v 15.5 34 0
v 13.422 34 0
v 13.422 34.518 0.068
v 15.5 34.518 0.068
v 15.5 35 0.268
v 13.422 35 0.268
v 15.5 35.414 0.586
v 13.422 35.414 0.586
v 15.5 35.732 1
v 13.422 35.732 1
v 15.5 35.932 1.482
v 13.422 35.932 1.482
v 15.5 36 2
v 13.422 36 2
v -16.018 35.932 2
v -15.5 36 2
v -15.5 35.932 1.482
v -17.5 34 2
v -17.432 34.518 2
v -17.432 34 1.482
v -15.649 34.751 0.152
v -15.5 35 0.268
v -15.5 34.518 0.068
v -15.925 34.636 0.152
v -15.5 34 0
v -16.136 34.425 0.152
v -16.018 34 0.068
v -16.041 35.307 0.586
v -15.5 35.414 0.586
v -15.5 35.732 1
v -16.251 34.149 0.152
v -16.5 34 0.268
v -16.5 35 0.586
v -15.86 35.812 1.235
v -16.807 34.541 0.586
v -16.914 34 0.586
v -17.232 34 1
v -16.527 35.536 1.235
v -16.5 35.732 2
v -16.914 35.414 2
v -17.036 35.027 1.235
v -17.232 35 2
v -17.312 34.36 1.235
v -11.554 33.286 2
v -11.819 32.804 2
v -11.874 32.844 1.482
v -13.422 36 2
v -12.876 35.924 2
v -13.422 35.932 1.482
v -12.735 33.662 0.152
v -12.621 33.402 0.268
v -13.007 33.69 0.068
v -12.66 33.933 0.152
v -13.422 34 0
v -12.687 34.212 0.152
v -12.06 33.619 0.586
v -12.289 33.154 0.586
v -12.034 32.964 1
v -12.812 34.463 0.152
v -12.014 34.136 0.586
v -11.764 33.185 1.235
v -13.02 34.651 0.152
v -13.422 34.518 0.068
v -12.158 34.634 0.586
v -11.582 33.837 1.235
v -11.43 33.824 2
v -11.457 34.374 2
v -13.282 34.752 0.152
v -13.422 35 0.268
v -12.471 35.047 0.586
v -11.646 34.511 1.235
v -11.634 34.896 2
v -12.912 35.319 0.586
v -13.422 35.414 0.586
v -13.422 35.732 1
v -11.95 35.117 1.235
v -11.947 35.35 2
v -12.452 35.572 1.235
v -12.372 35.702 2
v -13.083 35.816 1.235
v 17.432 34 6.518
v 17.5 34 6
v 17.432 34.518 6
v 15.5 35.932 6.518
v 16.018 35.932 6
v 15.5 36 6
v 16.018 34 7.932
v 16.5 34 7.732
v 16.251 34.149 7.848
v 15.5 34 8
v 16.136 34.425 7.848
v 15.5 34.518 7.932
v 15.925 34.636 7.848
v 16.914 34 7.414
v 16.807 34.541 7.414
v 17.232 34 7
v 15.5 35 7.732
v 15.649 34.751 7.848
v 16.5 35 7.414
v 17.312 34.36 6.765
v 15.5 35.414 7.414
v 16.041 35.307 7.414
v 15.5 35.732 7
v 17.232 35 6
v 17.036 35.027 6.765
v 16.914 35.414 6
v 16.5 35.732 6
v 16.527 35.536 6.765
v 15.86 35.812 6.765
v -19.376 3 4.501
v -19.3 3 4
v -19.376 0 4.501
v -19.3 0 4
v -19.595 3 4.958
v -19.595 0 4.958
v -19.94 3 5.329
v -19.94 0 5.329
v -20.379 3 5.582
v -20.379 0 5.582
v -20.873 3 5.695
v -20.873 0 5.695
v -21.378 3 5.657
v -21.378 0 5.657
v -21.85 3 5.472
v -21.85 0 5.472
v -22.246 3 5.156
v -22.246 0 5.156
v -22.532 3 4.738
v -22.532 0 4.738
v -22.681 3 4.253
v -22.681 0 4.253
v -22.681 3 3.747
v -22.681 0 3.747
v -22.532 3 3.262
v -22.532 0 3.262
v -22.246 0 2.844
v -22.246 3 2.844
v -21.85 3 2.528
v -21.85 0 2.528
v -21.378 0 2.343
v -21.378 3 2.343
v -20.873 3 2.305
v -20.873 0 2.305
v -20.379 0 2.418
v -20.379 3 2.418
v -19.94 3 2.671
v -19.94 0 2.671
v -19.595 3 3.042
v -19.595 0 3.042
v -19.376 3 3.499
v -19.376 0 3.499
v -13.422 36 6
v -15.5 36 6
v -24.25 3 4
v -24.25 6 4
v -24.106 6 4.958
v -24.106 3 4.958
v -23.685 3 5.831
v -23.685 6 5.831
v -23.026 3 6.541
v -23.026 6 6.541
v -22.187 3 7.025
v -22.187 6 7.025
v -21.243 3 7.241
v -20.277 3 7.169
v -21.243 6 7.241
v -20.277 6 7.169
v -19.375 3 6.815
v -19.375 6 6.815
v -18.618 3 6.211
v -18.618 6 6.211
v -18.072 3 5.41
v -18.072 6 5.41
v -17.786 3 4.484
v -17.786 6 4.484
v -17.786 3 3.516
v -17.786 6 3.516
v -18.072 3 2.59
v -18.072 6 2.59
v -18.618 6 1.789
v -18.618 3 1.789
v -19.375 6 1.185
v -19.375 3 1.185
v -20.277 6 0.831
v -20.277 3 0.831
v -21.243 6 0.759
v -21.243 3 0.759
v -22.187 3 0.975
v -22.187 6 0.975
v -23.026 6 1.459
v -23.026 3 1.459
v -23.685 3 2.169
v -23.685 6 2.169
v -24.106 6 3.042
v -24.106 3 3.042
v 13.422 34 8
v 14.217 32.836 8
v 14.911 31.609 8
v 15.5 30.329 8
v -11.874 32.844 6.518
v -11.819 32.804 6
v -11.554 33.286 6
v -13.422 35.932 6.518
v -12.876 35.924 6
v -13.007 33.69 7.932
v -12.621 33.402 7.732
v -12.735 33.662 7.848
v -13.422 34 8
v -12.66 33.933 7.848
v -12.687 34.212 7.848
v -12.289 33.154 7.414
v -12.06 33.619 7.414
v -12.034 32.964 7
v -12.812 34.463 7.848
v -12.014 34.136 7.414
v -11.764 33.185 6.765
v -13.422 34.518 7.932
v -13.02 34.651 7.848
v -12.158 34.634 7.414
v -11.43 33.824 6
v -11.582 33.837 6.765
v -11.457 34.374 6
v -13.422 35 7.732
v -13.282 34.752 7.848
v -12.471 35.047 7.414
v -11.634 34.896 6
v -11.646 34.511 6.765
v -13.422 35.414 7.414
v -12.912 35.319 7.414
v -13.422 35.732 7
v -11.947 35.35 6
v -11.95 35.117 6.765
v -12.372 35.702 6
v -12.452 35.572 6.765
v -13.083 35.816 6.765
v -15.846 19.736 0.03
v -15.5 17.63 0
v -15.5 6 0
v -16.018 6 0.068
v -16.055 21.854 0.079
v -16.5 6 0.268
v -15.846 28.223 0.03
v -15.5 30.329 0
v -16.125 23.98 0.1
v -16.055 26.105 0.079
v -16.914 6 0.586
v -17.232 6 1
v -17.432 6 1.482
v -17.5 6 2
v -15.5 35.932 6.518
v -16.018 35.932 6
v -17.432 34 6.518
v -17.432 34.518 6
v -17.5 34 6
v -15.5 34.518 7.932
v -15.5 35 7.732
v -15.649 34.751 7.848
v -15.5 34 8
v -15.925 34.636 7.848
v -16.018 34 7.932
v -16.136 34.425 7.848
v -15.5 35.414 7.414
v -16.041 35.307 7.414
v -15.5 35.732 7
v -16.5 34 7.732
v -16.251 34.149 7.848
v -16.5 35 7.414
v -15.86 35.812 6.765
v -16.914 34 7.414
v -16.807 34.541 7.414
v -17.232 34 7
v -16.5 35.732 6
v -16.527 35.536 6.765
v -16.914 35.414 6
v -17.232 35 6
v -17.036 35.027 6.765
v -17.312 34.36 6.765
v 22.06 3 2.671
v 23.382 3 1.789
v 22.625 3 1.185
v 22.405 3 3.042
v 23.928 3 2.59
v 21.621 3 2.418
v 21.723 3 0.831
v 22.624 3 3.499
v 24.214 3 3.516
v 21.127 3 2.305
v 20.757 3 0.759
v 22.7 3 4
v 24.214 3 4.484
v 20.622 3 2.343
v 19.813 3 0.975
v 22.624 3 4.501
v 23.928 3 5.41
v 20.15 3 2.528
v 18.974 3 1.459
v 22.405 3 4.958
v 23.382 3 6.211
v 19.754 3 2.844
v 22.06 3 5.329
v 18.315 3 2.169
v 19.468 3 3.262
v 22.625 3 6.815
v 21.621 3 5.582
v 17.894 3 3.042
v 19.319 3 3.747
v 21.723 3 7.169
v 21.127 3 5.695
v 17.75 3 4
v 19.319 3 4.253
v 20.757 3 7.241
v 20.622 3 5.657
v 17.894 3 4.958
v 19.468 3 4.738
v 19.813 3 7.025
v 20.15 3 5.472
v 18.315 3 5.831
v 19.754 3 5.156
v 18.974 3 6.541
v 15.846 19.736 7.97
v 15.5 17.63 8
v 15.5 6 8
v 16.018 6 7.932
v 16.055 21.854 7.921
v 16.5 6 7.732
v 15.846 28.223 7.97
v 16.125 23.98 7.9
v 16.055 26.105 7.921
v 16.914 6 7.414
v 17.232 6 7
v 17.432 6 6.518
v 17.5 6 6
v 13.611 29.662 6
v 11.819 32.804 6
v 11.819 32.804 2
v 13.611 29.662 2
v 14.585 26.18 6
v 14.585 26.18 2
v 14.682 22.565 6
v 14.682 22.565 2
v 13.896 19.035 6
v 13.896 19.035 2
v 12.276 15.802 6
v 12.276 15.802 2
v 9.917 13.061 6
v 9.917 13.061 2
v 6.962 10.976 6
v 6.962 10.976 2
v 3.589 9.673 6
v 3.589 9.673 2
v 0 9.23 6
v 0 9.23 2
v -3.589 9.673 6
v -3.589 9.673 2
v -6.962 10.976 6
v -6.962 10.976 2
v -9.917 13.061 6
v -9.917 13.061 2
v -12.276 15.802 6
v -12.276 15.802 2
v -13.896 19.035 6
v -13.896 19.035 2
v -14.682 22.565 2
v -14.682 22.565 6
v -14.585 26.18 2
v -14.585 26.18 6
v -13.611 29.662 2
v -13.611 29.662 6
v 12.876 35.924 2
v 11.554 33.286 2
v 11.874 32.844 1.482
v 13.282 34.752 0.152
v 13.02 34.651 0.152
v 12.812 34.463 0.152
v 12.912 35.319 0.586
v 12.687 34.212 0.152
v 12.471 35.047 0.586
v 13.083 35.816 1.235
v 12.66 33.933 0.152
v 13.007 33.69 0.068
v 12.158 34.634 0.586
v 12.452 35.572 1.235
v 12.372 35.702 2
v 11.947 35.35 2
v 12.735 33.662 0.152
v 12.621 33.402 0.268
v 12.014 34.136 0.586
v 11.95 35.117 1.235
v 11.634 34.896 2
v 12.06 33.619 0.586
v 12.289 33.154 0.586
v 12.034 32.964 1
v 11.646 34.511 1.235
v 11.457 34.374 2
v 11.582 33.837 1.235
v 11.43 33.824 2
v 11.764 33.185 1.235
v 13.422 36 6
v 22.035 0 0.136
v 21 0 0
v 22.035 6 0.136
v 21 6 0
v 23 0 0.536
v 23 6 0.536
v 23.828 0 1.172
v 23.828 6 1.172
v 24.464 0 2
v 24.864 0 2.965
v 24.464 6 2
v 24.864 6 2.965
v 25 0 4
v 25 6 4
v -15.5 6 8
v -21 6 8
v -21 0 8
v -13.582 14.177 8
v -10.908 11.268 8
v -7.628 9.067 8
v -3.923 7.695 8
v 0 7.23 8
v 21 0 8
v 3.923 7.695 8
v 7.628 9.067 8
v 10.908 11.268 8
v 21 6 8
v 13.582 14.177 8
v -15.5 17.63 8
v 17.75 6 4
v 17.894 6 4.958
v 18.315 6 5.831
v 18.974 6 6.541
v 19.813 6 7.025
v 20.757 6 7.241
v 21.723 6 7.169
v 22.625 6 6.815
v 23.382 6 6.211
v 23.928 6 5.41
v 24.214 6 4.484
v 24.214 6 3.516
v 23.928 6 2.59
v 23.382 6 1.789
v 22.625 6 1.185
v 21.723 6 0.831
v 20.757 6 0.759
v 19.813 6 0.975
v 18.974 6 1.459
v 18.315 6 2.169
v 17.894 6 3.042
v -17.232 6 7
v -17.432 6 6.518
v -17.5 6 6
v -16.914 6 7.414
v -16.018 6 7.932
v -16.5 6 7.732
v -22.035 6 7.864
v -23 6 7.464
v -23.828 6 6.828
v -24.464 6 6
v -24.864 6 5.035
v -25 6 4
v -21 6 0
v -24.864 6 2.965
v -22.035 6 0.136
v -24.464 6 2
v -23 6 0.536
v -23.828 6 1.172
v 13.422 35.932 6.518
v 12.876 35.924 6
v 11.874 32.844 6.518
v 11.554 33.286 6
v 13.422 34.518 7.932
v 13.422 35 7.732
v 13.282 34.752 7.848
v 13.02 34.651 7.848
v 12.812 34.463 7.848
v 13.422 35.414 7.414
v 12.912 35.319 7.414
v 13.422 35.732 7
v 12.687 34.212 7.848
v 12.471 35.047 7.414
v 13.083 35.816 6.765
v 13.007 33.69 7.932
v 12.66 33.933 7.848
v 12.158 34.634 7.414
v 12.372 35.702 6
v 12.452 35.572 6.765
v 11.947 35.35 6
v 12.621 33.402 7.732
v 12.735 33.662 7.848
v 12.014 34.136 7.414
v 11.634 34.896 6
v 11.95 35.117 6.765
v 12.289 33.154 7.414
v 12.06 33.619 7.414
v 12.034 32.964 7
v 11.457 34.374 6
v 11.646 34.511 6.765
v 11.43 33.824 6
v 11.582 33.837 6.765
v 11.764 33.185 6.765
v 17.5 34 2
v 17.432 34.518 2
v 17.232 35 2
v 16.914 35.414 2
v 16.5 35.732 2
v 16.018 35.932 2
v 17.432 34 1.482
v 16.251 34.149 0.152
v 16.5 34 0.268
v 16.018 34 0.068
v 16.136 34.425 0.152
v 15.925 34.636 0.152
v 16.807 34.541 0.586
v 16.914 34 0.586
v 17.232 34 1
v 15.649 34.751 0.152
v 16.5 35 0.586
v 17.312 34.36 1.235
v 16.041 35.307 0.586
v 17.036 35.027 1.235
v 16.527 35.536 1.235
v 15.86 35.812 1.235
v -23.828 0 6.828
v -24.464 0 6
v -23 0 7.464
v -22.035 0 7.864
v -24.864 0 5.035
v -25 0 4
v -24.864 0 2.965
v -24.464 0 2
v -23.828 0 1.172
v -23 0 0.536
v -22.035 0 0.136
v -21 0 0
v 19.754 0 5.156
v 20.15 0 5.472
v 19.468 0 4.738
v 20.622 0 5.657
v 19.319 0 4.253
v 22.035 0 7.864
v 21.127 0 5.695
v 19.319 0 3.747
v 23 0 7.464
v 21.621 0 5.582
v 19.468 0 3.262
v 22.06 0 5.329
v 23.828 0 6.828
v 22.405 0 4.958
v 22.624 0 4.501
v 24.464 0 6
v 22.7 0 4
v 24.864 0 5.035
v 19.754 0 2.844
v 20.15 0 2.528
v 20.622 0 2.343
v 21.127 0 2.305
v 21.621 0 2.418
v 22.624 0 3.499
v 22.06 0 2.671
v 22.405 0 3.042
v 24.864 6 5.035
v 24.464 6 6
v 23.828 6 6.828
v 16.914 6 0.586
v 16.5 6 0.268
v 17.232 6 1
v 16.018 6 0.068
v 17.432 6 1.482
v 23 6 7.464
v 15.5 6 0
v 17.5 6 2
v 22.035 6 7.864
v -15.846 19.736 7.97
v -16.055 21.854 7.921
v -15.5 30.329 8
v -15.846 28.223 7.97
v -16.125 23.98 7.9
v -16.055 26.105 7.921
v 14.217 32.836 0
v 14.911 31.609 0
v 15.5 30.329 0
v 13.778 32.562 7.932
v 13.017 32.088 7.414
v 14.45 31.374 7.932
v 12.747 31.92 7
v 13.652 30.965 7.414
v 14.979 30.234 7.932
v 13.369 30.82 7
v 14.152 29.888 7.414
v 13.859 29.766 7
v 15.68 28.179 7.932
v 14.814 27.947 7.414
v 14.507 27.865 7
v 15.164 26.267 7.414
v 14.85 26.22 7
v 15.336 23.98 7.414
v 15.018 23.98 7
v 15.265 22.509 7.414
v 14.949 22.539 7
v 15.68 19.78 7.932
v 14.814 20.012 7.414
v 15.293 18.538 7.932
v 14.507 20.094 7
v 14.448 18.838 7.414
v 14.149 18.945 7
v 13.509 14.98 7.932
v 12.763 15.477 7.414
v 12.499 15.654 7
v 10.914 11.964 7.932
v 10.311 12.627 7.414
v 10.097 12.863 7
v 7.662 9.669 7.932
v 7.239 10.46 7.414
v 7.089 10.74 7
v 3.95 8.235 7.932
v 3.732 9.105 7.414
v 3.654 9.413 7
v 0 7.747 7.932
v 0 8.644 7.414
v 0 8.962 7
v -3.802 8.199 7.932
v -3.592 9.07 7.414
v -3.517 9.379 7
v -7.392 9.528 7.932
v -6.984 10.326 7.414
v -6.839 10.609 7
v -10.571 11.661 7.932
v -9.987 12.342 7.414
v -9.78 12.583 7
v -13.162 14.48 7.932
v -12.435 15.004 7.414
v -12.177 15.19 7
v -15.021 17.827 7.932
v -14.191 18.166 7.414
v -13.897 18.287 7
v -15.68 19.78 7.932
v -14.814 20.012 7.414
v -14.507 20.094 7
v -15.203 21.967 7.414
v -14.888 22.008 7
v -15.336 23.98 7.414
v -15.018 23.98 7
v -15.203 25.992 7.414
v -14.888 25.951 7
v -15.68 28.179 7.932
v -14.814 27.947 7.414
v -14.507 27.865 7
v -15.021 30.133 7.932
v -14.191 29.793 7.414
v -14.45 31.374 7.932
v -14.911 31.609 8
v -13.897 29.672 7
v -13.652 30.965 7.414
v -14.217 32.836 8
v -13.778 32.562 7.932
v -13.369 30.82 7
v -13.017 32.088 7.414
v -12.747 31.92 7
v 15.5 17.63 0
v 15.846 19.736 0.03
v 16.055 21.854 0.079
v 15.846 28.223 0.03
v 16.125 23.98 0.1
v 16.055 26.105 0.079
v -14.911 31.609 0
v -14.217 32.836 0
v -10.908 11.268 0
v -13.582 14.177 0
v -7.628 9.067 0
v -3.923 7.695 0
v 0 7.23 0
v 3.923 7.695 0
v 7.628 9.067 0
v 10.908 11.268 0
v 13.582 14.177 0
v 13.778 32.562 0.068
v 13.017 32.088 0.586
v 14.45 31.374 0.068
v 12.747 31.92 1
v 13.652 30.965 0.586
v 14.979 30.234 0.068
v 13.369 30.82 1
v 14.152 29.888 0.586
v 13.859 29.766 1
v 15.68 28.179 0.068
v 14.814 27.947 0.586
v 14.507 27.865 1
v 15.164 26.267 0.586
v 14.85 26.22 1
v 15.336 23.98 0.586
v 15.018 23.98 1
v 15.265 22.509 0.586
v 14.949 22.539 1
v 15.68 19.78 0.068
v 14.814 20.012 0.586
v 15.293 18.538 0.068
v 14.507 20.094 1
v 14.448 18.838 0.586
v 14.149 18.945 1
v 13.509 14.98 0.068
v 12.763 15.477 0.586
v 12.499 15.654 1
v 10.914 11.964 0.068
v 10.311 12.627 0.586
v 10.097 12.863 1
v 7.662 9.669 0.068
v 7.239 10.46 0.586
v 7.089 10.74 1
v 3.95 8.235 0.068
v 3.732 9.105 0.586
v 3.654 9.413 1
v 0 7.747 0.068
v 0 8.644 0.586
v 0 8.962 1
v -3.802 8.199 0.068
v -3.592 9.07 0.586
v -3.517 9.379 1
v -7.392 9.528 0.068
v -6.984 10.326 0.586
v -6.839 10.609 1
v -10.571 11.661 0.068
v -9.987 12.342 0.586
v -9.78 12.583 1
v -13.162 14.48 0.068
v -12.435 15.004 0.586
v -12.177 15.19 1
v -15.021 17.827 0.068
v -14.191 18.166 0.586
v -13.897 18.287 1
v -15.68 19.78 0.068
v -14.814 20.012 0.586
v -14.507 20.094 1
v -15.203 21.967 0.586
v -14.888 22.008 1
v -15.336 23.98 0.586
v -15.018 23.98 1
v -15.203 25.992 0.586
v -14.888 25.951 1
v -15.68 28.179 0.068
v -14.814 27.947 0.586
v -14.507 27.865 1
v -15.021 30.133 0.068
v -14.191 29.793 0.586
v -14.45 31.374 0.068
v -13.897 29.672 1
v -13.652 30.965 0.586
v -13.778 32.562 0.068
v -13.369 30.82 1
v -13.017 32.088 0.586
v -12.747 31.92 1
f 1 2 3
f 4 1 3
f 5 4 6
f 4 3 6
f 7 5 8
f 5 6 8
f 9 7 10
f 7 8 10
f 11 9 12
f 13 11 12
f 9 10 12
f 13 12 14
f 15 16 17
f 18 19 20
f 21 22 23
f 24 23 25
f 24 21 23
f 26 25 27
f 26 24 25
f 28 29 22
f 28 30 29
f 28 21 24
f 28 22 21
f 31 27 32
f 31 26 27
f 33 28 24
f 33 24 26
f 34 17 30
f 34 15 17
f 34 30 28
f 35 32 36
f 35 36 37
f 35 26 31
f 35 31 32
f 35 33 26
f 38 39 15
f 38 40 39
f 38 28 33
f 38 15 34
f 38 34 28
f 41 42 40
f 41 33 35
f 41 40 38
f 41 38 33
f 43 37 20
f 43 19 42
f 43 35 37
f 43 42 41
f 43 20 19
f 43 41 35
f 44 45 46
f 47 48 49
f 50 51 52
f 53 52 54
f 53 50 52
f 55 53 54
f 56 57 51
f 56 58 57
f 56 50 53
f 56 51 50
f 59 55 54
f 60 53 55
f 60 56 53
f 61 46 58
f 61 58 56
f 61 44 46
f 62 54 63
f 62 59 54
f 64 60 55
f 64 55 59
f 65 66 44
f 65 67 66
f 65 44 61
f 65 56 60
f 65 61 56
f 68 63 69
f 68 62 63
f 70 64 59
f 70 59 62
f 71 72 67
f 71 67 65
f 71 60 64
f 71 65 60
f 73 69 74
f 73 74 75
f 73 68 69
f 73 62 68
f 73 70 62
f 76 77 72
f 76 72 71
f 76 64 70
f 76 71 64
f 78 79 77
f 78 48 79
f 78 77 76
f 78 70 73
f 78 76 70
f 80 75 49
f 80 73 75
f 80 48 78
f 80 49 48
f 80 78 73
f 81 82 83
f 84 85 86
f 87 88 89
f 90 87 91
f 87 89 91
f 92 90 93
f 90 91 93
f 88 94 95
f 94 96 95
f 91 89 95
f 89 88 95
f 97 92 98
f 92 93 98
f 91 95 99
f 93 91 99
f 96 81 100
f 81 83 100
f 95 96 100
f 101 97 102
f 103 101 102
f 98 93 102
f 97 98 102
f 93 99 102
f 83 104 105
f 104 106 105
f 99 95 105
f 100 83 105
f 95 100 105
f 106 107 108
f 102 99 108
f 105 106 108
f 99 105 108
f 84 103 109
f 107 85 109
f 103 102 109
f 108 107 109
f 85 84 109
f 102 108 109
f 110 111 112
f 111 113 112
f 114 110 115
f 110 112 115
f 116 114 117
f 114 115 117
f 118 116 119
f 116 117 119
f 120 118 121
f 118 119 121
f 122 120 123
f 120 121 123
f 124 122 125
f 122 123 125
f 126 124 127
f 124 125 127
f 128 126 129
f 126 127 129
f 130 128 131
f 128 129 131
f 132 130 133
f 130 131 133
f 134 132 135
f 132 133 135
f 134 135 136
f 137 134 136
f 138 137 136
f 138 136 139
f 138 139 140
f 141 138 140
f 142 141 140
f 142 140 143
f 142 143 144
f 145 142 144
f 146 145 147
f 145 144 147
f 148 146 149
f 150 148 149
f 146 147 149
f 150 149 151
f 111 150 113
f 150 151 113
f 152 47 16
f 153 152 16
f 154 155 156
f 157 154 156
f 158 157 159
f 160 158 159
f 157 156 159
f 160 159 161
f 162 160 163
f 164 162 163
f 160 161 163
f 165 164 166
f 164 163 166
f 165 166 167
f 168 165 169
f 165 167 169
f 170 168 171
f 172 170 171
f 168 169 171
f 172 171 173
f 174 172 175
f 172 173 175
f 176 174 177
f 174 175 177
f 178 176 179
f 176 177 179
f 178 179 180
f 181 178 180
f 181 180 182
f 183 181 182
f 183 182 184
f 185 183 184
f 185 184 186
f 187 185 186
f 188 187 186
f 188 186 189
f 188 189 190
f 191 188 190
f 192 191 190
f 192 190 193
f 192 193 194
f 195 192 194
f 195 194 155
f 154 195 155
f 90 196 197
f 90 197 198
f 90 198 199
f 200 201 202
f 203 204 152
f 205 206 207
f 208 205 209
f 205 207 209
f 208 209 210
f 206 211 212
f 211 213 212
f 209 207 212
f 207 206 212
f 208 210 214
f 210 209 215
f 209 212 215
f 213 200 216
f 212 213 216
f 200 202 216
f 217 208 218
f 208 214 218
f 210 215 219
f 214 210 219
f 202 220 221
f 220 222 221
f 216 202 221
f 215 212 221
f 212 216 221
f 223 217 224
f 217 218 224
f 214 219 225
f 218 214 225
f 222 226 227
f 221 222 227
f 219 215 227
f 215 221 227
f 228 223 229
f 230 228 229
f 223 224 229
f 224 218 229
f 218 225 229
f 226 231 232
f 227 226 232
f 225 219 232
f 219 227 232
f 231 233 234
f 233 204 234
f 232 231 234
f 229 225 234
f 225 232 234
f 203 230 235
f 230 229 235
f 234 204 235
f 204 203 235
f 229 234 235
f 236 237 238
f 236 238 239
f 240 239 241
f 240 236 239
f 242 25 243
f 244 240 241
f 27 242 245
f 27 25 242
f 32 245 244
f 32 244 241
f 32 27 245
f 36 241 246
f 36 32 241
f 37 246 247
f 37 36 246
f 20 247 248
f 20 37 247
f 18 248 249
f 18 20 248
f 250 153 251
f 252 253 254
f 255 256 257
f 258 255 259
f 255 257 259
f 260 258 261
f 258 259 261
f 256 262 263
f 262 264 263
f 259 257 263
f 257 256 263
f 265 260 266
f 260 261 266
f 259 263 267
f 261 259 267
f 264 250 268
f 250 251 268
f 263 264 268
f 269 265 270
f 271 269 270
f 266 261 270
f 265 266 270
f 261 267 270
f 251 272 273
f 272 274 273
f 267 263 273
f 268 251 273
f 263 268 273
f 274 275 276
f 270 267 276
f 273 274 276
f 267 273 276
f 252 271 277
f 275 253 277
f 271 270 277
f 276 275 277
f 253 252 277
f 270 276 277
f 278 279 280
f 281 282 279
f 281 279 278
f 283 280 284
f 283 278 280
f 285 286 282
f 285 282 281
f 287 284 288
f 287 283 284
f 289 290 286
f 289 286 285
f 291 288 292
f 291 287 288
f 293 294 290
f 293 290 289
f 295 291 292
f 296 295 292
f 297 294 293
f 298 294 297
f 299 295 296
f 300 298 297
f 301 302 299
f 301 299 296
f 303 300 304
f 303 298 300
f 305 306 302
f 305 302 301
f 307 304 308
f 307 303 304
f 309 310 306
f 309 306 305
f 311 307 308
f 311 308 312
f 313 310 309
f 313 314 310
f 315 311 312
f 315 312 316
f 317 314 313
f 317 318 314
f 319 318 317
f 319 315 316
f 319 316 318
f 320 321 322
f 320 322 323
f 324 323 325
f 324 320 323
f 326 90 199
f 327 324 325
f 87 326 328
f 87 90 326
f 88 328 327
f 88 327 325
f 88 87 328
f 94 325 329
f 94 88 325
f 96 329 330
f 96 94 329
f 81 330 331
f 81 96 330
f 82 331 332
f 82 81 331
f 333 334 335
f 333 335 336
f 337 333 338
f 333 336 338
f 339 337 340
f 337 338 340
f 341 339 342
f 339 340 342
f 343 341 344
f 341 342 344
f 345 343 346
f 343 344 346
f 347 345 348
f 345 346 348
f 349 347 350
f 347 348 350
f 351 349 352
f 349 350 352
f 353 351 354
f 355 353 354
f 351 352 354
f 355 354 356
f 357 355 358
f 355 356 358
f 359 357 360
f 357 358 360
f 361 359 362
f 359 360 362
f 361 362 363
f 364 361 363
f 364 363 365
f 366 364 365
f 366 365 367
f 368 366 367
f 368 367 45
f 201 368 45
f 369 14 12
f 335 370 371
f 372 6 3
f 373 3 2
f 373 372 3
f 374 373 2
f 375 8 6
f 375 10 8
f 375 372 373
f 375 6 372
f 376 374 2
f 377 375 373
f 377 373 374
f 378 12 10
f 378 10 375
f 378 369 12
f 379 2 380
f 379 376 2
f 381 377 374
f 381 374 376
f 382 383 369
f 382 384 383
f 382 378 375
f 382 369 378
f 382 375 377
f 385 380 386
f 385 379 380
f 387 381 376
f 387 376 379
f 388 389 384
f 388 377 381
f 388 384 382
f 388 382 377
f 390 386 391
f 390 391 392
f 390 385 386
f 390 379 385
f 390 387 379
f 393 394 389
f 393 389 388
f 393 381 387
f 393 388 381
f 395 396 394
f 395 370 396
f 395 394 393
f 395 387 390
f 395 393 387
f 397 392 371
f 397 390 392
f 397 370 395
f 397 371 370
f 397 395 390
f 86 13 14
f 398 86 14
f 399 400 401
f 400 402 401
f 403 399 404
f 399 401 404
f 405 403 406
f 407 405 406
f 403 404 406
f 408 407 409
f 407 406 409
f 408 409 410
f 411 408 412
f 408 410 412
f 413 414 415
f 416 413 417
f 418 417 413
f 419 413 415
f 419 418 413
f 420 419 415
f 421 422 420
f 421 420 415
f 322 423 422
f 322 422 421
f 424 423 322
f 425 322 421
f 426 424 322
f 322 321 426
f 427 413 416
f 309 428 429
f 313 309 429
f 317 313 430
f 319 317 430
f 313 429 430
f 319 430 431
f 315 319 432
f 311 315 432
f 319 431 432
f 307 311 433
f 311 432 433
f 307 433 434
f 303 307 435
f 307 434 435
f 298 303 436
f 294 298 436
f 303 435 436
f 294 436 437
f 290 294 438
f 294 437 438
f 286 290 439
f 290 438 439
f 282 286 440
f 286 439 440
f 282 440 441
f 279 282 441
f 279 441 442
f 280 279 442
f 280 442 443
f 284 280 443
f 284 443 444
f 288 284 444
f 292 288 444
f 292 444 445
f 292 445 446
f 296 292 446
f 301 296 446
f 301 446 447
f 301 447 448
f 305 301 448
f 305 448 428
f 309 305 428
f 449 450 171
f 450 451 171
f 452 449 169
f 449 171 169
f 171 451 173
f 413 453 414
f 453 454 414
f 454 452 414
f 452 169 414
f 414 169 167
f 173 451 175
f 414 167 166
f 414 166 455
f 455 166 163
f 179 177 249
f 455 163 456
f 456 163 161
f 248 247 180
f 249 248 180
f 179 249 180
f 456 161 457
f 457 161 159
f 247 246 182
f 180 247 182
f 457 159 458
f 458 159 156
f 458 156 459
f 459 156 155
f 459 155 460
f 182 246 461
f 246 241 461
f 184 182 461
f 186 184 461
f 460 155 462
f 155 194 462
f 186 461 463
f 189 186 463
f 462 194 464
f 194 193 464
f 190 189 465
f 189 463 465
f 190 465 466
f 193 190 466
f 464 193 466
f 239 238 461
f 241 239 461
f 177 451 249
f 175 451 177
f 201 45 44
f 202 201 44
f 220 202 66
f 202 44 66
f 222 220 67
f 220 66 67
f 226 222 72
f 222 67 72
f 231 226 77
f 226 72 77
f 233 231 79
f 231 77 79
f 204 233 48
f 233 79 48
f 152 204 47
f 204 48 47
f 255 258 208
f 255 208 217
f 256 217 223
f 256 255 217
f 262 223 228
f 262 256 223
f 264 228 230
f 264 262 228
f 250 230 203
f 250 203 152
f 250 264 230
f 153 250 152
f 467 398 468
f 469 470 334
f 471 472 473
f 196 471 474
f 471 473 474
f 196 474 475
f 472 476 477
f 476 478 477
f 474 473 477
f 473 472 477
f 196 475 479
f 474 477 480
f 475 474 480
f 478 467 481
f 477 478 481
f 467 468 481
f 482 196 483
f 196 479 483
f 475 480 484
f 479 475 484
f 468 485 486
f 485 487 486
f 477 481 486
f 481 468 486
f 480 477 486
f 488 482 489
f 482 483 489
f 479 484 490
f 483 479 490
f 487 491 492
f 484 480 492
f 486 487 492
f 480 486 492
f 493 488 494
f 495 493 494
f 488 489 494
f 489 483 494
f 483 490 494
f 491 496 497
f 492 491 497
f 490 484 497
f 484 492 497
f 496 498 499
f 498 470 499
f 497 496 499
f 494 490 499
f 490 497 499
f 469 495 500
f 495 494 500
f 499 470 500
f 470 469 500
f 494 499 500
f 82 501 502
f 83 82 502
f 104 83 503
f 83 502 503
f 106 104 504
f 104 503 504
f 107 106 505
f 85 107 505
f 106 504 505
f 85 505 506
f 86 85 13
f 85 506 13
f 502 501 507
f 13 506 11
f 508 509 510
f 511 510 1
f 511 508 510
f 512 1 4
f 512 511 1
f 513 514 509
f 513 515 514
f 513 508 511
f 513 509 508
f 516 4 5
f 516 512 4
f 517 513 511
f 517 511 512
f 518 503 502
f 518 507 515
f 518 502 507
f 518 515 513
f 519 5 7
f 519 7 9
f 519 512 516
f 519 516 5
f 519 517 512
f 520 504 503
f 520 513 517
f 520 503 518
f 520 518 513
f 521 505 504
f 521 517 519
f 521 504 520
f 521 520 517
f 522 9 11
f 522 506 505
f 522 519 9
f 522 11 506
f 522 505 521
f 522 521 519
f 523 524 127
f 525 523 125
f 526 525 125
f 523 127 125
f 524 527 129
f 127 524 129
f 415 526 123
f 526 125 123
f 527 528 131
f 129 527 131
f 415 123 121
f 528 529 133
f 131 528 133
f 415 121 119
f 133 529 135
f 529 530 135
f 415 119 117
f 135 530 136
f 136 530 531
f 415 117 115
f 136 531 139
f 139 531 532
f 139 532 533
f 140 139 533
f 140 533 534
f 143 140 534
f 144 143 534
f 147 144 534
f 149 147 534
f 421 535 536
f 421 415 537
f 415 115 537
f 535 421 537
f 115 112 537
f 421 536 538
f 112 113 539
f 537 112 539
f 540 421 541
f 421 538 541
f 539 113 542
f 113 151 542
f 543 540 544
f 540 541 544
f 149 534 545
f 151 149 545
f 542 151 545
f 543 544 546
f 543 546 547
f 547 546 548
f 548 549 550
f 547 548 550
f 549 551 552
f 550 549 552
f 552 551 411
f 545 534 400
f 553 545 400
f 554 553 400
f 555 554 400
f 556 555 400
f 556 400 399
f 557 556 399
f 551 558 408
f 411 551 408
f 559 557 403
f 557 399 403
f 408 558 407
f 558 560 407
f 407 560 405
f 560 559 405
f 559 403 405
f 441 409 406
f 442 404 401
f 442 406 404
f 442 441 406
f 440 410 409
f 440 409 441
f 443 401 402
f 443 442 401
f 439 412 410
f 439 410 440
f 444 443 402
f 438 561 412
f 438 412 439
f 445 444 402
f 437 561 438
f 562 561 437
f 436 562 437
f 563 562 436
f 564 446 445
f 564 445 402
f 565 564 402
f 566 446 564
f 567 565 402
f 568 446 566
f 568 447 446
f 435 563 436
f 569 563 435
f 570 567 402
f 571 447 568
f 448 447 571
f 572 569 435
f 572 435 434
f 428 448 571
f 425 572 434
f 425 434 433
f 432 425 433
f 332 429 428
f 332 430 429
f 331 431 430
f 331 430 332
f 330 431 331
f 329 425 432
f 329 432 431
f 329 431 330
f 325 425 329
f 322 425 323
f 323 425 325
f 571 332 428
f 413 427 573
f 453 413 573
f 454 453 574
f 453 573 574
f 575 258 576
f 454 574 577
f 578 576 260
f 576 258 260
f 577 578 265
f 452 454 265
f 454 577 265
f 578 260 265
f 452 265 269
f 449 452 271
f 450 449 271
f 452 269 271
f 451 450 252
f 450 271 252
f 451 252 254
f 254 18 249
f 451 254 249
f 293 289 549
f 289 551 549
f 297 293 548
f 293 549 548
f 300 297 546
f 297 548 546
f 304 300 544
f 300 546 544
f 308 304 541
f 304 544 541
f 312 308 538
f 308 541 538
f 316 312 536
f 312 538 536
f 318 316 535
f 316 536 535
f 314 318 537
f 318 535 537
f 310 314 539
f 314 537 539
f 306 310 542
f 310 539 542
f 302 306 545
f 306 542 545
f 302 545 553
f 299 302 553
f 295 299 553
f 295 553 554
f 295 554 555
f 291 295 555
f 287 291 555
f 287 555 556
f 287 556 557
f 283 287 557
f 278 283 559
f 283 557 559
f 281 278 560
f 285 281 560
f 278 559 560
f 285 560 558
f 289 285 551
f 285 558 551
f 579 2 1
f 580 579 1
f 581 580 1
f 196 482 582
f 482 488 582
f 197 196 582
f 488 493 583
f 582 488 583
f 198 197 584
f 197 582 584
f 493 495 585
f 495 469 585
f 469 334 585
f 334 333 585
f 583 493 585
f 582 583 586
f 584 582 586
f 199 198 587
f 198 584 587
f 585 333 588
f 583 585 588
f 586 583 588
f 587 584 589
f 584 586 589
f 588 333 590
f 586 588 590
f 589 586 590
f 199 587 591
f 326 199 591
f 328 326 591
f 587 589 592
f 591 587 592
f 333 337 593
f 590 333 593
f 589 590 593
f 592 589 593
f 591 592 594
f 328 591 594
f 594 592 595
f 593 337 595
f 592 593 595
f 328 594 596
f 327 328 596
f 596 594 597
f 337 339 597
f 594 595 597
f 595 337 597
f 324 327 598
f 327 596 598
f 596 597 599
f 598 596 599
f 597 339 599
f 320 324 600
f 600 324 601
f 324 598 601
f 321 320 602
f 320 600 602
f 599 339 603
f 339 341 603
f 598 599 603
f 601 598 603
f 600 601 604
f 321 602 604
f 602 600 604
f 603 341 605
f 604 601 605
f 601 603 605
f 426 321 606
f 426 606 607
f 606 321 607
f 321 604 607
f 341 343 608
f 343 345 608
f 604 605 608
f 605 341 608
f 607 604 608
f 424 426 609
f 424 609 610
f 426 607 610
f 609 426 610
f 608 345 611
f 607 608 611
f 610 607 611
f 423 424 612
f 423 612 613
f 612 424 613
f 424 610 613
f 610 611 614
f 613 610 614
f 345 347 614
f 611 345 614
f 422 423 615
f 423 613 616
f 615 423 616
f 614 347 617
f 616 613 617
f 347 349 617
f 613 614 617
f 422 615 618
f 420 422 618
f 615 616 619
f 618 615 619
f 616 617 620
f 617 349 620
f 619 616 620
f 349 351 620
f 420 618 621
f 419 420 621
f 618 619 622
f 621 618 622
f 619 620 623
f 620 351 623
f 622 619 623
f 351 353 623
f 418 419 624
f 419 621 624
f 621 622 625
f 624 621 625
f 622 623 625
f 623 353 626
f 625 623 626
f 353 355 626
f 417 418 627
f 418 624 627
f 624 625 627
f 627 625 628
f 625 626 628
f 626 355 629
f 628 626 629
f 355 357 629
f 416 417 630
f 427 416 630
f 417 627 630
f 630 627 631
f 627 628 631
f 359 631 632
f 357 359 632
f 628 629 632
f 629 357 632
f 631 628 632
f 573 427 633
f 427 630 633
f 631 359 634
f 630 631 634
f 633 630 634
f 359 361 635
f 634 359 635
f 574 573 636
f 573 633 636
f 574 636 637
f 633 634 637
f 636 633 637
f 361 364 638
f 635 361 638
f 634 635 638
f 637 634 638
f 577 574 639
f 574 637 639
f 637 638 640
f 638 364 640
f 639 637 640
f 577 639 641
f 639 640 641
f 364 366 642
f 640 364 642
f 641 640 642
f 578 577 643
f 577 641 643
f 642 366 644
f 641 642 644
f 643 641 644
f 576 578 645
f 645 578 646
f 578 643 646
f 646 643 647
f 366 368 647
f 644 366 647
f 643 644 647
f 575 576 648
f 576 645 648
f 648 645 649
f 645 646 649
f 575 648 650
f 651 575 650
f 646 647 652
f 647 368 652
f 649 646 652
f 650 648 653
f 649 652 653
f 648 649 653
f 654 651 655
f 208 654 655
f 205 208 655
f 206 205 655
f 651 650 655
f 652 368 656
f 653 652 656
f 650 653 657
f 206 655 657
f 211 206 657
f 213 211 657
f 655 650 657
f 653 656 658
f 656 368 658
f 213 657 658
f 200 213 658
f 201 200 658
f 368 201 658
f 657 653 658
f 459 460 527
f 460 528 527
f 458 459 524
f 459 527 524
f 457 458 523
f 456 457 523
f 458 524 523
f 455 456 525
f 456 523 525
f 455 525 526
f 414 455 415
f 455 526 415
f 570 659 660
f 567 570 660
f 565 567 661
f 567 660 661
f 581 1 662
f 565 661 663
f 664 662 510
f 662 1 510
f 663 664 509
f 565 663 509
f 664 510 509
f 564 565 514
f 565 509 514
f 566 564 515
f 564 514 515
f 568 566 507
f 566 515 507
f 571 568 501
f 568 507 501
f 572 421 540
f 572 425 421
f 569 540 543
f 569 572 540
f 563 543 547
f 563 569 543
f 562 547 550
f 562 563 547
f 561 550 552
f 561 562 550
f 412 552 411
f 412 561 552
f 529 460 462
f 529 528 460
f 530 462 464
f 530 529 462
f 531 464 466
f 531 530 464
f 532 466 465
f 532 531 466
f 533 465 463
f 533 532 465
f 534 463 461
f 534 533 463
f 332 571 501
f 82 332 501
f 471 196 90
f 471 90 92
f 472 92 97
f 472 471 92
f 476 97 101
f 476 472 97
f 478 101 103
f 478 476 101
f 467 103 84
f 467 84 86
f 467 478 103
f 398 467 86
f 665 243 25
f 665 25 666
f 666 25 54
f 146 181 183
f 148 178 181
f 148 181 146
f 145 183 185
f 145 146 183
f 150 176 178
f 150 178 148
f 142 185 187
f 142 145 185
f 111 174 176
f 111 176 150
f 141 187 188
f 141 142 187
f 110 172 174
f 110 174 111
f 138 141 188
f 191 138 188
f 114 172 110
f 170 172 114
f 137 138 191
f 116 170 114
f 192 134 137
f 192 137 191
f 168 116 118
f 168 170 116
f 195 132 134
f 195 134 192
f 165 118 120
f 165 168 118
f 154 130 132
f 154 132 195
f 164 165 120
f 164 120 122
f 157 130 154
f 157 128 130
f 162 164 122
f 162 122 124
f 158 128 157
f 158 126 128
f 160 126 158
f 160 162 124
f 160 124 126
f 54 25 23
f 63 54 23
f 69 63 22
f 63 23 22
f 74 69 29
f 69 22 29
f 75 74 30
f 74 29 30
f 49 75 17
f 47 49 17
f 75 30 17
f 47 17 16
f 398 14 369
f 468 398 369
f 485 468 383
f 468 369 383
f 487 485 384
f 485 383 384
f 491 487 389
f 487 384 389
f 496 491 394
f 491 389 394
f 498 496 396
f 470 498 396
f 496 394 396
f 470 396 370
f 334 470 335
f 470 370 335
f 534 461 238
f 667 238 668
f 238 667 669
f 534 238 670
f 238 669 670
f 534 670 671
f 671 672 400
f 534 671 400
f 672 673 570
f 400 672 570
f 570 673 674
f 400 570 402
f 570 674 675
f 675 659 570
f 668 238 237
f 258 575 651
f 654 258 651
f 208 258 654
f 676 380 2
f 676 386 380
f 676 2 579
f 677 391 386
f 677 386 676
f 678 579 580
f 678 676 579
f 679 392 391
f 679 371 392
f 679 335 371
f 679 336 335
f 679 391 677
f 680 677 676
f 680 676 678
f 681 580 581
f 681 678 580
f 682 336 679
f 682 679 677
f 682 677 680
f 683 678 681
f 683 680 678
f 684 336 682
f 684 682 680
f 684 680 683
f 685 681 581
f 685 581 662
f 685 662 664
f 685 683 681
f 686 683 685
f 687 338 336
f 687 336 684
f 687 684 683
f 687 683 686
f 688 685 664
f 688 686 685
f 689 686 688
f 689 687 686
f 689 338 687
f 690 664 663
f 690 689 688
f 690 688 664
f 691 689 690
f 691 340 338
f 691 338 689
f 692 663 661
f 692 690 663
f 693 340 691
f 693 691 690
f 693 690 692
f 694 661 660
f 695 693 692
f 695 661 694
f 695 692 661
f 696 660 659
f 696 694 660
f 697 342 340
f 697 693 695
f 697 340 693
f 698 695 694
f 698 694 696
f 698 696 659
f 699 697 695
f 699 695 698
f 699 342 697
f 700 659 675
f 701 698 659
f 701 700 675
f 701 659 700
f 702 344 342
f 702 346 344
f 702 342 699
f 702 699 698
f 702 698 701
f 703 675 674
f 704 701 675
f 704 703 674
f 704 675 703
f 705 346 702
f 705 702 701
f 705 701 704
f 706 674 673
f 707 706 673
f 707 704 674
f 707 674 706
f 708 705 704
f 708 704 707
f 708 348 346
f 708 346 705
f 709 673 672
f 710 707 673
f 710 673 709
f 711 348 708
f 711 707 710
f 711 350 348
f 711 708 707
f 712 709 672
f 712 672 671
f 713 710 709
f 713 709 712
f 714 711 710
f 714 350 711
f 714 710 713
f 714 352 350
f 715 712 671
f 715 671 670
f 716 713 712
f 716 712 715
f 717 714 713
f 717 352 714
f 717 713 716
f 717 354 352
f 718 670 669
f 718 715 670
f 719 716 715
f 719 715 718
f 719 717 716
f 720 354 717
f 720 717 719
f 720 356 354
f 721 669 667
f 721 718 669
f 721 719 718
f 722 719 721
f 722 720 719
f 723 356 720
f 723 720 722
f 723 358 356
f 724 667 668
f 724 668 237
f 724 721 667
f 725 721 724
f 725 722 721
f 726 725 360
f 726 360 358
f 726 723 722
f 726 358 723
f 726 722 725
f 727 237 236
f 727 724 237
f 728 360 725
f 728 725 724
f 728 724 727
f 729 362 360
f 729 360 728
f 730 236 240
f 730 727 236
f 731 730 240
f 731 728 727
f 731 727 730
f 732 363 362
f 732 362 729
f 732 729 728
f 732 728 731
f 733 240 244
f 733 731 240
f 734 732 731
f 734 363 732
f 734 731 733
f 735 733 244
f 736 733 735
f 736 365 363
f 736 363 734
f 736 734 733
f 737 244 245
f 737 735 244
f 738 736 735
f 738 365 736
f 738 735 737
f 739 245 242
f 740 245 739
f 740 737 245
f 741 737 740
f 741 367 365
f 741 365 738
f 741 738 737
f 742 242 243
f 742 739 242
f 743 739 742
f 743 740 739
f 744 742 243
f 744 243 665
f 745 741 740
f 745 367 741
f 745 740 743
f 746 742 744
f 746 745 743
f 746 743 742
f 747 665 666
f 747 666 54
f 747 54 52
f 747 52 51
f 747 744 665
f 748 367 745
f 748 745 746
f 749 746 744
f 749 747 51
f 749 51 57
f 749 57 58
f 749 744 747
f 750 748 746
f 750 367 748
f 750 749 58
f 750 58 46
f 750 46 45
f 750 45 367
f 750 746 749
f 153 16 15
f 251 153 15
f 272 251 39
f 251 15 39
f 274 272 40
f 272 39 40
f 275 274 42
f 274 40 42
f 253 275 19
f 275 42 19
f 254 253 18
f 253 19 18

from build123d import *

# Parameters (mm, degrees)
F1_DEPTH             = 8
F4_D                 = 3.4
F4_CBORE_D           = 6.5
F4_CBORE_DEPTH       = 3
F4_ON_F3_D           = 3.4
F4_ON_F3_CBORE_D     = 6.5
F4_ON_F3_CBORE_DEPTH = 3
F5_T1_DEPTH          = 2.0779215299
F5_T3_DEPTH          = 28
F5_T5_DEPTH          = 2.0779215299
F5_T8_ANGLE          = 253.4876833877
F5_T10_ANGLE         = 253.4876833877
F5_T12_ANGLE         = 126.7438416939
F5_T14_ANGLE         = 126.7438416939
F5_T16_ANGLE         = 90
F5_T18_ANGLE         = 90
F5_T20_ANGLE         = 126.7438416939
F5_T22_ANGLE         = 126.7438416939
F5_T24_ANGLE         = 90
F5_T26_ANGLE         = 90
F6_R                 = 3.99999


# Not quite as in the source:
# - a fillet or chamfer that OpenCascade refuses, or shapes differently, is made with other operations: its cross-section is extruded or revolved along the edge and cut away or added
# - a fillet or chamfer is up to 0.001 mm smaller than in the source, because OpenCascade refuses the exact size


with BuildPart() as f1:
    # F0 (on Top) → F1 (new body)
    with BuildSketch(Plane.XY):
        Polygon((-25, 6), (-25, 0), (25, 0), (25, 6), (17.5, 6), (-17.5, 6), align=None)
        with BuildLine():
            Line((-17.5, 34), (-17.5, 6))
            Line((-17.5, 6), (17.5, 6))
            Line((17.5, 6), (17.5, 34))
            ThreePointArc((17.5, 34), (16.9142135624, 35.4142135624), (15.5, 36))
            Line((15.5, 36), (13.4220784701, 36))
            ThreePointArc((13.4220784701, 36), (11.634209081, 34.896394471), (11.8194422349, 32.8035230476))
            ThreePointArc((11.8194422349, 32.8035230476), (0, 9.229505524), (-11.8194422349, 32.8035230476))
            ThreePointArc((-11.8194422349, 32.8035230476), (-11.634209081, 34.896394471), (-13.4220784701, 36))
            Line((-13.4220784701, 36), (-15.5, 36))
            ThreePointArc((-15.5, 36), (-16.9142135624, 35.4142135624), (-17.5, 34))
        make_face()
    extrude(amount=F1_DEPTH)

    # F4 (through all)
    with Locations(Plane(origin=(0, 6, 0), x_dir=(-1, 0, 0), z_dir=(0, 1, 0))):
        with Locations((-21, 4)):
            CounterBoreHole(F4_D / 2, F4_CBORE_D / 2, F4_CBORE_DEPTH)

    # F4 on F3 (through all)
    with Locations(Plane(origin=(0, 6, 0), x_dir=(-1, 0, 0), z_dir=(0, 1, 0))):
        with Locations((21, 4)):
            CounterBoreHole(F4_ON_F3_D / 2, F4_ON_F3_CBORE_D / 2, F4_ON_F3_CBORE_DEPTH)

    # F5: fillet of radius 2 on 2 edges, made by hand

    # F5_s2 → F5_t1 (cut)
    with BuildSketch(Plane.YZ.offset(-15.5)):
        with BuildLine():
            ThreePointArc((34, 8), (35.4142135624, 7.4142135624), (36, 6))
            Line((36, 6), (36, 8))
            Line((36, 8), (34, 8))
        make_face()
        with BuildLine():
            ThreePointArc((34, 0), (35.4142135624, 0.5857864376), (36, 2))
            Line((36, 2), (36, 0))
            Line((36, 0), (34, 0))
        make_face()
    extrude(amount=F5_T1_DEPTH, mode=Mode.SUBTRACT)

    # F5_s4 → F5_t3 (cut)
    with BuildSketch(Plane.XZ.offset(-34)):
        with BuildLine():
            ThreePointArc((-15.5, 8), (-16.9142135624, 7.4142135624), (-17.5, 6))
            Line((-17.5, 6), (-17.5, 8))
            Line((-17.5, 8), (-15.5, 8))
        make_face()
        with BuildLine():
            ThreePointArc((15.5, 8), (16.9142135624, 7.4142135624), (17.5, 6))
            Line((17.5, 6), (17.5, 8))
            Line((17.5, 8), (15.5, 8))
        make_face()
        with BuildLine():
            ThreePointArc((-15.5, 0), (-16.9142135624, 0.5857864376), (-17.5, 2))
            Line((-17.5, 2), (-17.5, 0))
            Line((-17.5, 0), (-15.5, 0))
        make_face()
        with BuildLine():
            ThreePointArc((15.5, 0), (16.9142135624, 0.5857864376), (17.5, 2))
            Line((17.5, 2), (17.5, 0))
            Line((17.5, 0), (15.5, 0))
        make_face()
    extrude(amount=F5_T3_DEPTH, mode=Mode.SUBTRACT)

    # F5_s6 → F5_t5 (cut)
    with BuildSketch(Plane.YZ.offset(13.4220784701)):
        with BuildLine():
            ThreePointArc((34, 8), (35.4142135624, 7.4142135624), (36, 6))
            Line((36, 6), (36, 8))
            Line((36, 8), (34, 8))
        make_face()
        with BuildLine():
            ThreePointArc((34, 0), (35.4142135624, 0.5857864376), (36, 2))
            Line((36, 2), (36, 0))
            Line((36, 0), (34, 0))
        make_face()
    extrude(amount=F5_T5_DEPTH, mode=Mode.SUBTRACT)

    # F5_s7 → F5_t8 (revolve, cut)
    with BuildSketch(Plane(origin=(-11.4952792826, 15.3974976921, 0), x_dir=(0, 0, 1), z_dir=(-0.5982384762, 0.8013181176, 0))):
        with BuildLine():
            ThreePointArc((0, 31.0954628442), (0.5857864376, 29.6812492818), (2, 29.0954628442))
            Line((2, 29.0954628442), (0, 29.0954628442))
            Line((0, 29.0954628442), (0, 31.0954628442))
        make_face()
    revolve(axis=Axis((0, 23.979505524, 0), (0, 0, -1)), revolution_arc=F5_T8_ANGLE, mode=Mode.SUBTRACT)

    # F5_s9 → F5_t10 (revolve, cut)
    with BuildSketch(Plane(origin=(-11.4952792826, 15.3974976921, 0), x_dir=(0, 0, 1), z_dir=(-0.5982384762, 0.8013181176, 0))):
        with BuildLine():
            ThreePointArc((8, 31.0954628442), (7.4142135624, 29.6812492818), (6, 29.0954628442))
            Line((6, 29.0954628442), (8, 29.0954628442))
            Line((8, 29.0954628442), (8, 31.0954628442))
        make_face()
    revolve(axis=Axis((0, 23.979505524, 8), (0, 0, -1)), revolution_arc=F5_T10_ANGLE, mode=Mode.SUBTRACT)

    # F5_s11 → F5_t12 (revolve, cut)
    with BuildSketch(Plane.YZ.offset(13.4220784701)):
        with BuildLine():
            ThreePointArc((34, 8), (35.4142135624, 7.4142135624), (36, 6))
            Line((36, 6), (36, 8))
            Line((36, 8), (34, 8))
        make_face()
    revolve(axis=Axis((13.4220784701, 34, 8), (0, 0, 1)), revolution_arc=F5_T12_ANGLE, mode=Mode.SUBTRACT)

    # F5_s13 → F5_t14 (revolve, cut)
    with BuildSketch(Plane(origin=(11.4952792826, 15.3974976921, 0), x_dir=(0, 0, 1), z_dir=(-0.5982384762, -0.8013181176, 0))):
        with BuildLine():
            ThreePointArc((8, 31.0954628442), (7.4142135624, 29.6812492818), (6, 29.0954628442))
            Line((6, 29.0954628442), (8, 29.0954628442))
            Line((8, 29.0954628442), (8, 31.0954628442))
        make_face()
    revolve(axis=Axis((-13.4220784701, 34, 8), (0, 0, 1)), revolution_arc=F5_T14_ANGLE, mode=Mode.SUBTRACT)

    # F5_s15 → F5_t16 (revolve, cut)
    with BuildSketch(Plane.YZ.offset(-15.5)):
        with BuildLine():
            ThreePointArc((34, 8), (35.4142135624, 7.4142135624), (36, 6))
            Line((36, 6), (36, 8))
            Line((36, 8), (34, 8))
        make_face()
    revolve(axis=Axis((-15.5, 34, 8), (0, 0, 1)), revolution_arc=F5_T16_ANGLE, mode=Mode.SUBTRACT)

    # F5_s17 → F5_t18 (revolve, cut)
    with BuildSketch(Plane.XZ.offset(-34)):
        with BuildLine():
            ThreePointArc((15.5, 8), (16.9142135624, 7.4142135624), (17.5, 6))
            Line((17.5, 6), (17.5, 8))
            Line((17.5, 8), (15.5, 8))
        make_face()
    revolve(axis=Axis((15.5, 34, 8), (0, 0, 1)), revolution_arc=F5_T18_ANGLE, mode=Mode.SUBTRACT)

    # F5_s19 → F5_t20 (revolve, cut)
    with BuildSketch(Plane.YZ.offset(13.4220784701)):
        with BuildLine():
            ThreePointArc((34, 0), (35.4142135624, 0.5857864376), (36, 2))
            Line((36, 2), (36, 0))
            Line((36, 0), (34, 0))
        make_face()
    revolve(axis=Axis((13.4220784701, 34, 0), (0, 0, 1)), revolution_arc=F5_T20_ANGLE, mode=Mode.SUBTRACT)

    # F5_s21 → F5_t22 (revolve, cut)
    with BuildSketch(Plane(origin=(11.4952792826, 15.3974976921, 0), x_dir=(0, 0, 1), z_dir=(-0.5982384762, -0.8013181176, 0))):
        with BuildLine():
            ThreePointArc((0, 31.0954628442), (0.5857864376, 29.6812492818), (2, 29.0954628442))
            Line((2, 29.0954628442), (0, 29.0954628442))
            Line((0, 29.0954628442), (0, 31.0954628442))
        make_face()
    revolve(axis=Axis((-13.4220784701, 34, 0), (0, 0, 1)), revolution_arc=F5_T22_ANGLE, mode=Mode.SUBTRACT)

    # F5_s23 → F5_t24 (revolve, cut)
    with BuildSketch(Plane.YZ.offset(-15.5)):
        with BuildLine():
            ThreePointArc((34, 0), (35.4142135624, 0.5857864376), (36, 2))
            Line((36, 2), (36, 0))
            Line((36, 0), (34, 0))
        make_face()
    revolve(axis=Axis((-15.5, 34, 0), (0, 0, 1)), revolution_arc=F5_T24_ANGLE, mode=Mode.SUBTRACT)

    # F5_s25 → F5_t26 (revolve, cut)
    with BuildSketch(Plane.XZ.offset(-34)):
        with BuildLine():
            ThreePointArc((15.5, 0), (16.9142135624, 0.5857864376), (17.5, 2))
            Line((17.5, 2), (17.5, 0))
            Line((17.5, 0), (15.5, 0))
        make_face()
    revolve(axis=Axis((15.5, 34, 0), (0, 0, 1)), revolution_arc=F5_T26_ANGLE, mode=Mode.SUBTRACT)

    # F6 (radius 4 in the source; OpenCascade refuses exactly that, so slightly less here)
    f6_edges = [f1.edges().sort_by_distance(p)[0] for p in [
        (-25, 3, 0),
        (-25, 3, 8),
        (25, 3, 0),
        (25, 3, 8),
    ]]
    fillet(f6_edges, radius=F6_R)


solid = f1.part
